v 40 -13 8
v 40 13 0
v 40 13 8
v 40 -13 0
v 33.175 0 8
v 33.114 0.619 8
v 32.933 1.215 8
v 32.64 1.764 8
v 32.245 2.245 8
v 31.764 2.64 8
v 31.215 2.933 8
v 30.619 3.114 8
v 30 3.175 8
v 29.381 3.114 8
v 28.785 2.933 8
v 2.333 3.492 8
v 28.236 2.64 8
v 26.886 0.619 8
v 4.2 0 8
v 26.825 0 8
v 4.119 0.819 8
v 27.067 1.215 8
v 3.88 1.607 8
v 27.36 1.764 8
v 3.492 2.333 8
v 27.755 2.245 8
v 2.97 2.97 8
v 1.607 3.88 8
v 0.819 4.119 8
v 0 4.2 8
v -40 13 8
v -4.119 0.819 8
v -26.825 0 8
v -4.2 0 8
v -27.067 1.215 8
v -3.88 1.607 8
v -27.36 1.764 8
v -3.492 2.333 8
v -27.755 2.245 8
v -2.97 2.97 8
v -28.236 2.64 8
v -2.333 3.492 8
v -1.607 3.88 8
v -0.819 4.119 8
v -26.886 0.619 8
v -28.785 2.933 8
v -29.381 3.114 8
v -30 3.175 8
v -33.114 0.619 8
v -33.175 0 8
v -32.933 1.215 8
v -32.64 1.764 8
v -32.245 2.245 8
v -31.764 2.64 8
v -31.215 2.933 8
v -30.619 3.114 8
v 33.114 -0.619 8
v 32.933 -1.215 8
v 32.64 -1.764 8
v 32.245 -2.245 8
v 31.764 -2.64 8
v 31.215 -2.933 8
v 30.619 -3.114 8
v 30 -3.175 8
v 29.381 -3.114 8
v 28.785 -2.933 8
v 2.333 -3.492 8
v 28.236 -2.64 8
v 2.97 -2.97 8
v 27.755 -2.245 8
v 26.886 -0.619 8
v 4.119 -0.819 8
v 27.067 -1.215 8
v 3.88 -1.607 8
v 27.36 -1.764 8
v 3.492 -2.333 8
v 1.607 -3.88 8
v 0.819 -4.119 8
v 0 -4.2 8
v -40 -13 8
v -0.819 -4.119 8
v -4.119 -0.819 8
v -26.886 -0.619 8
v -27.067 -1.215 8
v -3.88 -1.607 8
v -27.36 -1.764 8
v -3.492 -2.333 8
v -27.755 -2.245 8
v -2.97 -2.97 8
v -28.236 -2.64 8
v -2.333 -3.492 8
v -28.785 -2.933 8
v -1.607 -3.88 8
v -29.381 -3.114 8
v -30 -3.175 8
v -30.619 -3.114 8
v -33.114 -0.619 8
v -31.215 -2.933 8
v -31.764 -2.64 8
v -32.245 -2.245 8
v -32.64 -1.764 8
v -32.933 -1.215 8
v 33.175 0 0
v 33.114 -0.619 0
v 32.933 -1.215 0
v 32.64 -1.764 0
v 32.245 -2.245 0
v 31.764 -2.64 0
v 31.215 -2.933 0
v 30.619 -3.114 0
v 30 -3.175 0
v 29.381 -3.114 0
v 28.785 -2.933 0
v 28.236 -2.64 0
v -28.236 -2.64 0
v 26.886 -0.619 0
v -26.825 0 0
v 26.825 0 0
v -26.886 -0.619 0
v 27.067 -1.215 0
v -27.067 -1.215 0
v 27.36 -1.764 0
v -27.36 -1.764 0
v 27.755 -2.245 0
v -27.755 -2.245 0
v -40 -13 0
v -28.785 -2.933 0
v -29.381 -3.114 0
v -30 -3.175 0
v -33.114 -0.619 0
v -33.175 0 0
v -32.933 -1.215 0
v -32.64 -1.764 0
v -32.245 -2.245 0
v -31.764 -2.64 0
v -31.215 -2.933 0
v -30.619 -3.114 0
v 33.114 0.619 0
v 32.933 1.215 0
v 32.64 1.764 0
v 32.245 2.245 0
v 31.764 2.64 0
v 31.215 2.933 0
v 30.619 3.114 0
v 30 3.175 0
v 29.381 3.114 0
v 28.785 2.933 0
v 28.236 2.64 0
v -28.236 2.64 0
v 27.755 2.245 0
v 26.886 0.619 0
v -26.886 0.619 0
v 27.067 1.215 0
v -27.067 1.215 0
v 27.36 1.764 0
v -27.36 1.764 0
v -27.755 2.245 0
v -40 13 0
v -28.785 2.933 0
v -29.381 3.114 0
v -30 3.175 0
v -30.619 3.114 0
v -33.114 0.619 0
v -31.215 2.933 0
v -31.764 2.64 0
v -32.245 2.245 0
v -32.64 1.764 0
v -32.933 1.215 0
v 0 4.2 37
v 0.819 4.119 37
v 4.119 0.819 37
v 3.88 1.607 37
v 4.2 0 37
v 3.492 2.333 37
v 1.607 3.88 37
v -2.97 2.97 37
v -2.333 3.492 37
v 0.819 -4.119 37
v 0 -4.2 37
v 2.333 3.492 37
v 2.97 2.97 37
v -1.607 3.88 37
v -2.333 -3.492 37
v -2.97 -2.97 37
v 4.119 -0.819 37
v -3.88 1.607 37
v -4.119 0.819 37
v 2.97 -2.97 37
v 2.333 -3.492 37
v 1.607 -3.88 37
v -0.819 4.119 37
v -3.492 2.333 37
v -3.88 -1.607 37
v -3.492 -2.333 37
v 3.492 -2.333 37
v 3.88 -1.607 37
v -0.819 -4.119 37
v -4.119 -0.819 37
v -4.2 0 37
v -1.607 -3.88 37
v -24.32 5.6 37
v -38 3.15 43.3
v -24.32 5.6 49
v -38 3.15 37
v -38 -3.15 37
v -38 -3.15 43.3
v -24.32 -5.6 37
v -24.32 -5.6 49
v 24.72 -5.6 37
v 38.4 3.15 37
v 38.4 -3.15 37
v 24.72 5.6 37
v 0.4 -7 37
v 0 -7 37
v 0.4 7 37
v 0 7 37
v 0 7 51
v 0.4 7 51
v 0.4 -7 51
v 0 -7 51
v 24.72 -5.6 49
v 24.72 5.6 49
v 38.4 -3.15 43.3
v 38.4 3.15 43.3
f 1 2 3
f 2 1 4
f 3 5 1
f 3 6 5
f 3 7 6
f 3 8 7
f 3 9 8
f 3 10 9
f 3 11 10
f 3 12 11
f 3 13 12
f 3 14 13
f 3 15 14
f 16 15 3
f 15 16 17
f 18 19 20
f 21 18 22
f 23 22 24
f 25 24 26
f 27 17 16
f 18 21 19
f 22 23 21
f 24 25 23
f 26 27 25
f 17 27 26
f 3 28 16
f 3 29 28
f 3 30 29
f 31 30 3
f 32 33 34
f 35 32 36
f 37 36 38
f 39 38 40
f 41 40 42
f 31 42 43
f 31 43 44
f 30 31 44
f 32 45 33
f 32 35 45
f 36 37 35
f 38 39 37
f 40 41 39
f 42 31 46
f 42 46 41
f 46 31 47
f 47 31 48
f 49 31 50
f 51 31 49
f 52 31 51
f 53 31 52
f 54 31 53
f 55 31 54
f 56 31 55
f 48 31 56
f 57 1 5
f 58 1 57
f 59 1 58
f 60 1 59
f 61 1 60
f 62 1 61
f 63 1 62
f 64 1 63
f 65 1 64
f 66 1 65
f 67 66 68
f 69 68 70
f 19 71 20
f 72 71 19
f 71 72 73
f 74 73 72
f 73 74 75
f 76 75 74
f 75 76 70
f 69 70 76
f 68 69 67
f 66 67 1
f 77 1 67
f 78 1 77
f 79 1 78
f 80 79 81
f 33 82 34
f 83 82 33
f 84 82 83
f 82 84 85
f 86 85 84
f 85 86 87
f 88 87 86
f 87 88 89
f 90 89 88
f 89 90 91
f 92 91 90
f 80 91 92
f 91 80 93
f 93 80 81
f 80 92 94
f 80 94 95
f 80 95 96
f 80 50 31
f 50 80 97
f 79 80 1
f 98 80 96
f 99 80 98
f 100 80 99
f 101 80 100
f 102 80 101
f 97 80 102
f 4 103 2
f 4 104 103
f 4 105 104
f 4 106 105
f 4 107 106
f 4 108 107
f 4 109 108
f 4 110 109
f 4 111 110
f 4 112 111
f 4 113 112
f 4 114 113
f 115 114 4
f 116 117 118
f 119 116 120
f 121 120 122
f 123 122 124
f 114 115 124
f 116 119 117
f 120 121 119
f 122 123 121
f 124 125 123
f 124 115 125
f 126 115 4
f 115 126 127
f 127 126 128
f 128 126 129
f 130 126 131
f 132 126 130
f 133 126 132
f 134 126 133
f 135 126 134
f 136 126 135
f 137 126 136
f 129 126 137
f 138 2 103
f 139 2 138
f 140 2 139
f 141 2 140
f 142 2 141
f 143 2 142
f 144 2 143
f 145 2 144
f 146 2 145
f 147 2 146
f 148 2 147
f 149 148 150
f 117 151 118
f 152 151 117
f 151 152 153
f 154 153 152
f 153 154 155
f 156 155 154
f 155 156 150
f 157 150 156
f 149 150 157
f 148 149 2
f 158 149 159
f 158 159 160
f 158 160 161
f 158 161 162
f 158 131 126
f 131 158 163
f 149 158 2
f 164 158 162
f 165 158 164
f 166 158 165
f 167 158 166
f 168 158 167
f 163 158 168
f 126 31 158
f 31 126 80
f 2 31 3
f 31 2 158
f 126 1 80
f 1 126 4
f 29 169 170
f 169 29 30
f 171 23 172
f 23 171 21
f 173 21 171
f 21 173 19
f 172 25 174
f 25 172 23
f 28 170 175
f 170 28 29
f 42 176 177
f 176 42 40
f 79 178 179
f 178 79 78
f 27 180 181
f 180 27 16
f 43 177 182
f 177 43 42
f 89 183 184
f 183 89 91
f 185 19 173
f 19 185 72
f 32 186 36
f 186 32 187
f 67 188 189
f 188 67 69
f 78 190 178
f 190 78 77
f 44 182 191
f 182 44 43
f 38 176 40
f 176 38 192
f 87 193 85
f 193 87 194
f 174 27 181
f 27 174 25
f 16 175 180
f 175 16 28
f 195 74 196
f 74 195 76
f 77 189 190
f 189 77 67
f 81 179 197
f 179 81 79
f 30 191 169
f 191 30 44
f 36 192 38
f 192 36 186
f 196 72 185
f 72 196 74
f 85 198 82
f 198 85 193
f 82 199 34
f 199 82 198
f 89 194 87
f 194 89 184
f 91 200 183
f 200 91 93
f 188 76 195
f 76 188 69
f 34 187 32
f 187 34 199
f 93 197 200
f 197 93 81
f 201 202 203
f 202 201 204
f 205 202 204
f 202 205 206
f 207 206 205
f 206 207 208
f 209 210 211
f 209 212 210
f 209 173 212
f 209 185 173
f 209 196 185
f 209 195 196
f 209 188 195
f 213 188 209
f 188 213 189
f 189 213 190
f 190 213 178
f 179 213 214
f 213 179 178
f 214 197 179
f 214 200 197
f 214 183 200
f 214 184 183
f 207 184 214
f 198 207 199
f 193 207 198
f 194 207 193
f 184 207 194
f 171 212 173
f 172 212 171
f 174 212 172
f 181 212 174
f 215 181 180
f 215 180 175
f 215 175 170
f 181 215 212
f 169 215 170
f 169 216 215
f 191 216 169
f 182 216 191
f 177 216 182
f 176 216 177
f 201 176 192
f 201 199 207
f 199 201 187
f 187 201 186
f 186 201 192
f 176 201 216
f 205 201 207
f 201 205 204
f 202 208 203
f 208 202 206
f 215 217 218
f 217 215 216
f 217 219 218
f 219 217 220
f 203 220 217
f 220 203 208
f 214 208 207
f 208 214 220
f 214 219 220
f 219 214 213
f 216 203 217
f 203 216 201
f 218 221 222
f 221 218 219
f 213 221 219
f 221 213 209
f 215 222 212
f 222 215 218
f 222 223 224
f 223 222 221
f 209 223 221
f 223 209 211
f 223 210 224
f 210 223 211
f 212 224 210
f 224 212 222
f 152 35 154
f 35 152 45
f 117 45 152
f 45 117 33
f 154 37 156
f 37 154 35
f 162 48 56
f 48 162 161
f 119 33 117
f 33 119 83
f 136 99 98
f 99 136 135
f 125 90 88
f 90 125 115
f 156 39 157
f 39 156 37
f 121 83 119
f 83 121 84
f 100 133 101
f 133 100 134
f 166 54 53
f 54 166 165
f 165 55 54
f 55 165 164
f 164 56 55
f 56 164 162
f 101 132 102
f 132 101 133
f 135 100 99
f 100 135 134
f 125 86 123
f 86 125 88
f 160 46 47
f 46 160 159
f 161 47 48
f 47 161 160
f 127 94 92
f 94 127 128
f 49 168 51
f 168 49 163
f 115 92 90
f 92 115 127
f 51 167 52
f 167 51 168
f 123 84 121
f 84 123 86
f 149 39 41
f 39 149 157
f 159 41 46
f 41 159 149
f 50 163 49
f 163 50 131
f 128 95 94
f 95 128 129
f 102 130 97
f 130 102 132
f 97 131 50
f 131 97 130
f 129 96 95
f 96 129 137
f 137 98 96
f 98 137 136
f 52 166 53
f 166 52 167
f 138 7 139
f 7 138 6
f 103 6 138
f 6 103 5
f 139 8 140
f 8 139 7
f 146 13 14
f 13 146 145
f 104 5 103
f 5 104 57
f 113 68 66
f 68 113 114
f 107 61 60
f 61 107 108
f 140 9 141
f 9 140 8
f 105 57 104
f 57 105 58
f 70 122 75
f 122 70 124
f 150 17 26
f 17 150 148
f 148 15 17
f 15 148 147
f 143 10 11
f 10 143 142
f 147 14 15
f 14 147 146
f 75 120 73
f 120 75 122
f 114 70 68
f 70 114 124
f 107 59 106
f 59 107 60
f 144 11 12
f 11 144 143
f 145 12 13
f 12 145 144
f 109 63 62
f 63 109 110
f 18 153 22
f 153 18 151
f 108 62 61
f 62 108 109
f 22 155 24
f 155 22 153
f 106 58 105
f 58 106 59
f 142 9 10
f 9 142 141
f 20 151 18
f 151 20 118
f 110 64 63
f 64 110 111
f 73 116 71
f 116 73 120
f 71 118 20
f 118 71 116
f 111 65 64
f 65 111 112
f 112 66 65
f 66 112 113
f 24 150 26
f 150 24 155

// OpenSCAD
$fn = 32;

// ----------------------------------------------------------------------
// Boat cleat: 80 mm base, horn 44 mm up
// ----------------------------------------------------------------------

// --- parameters (mm) ---
base_l = 80;              // base length
base_w = 26;              // base width
base_t = 8;               // base thickness
horn_len = 76;            // horn length
horn_d = 14;              // horn diameter at the middle
horn_z = 44;              // horn axis height
end_drop = 8;             // how far the horn tips drop
post_d = 8.4;             // centre post diameter
holes_d = 6.35;           // fixing holes
hole_x = 30;              // fixing hole spacing

difference() {
  union() {
    translate([-40, -13, 0]) cube([base_l, base_w, base_t]);
    /* centre post, sunk 1 mm into the base */
    translate([0, 0, 7]) cylinder(h = 37, d = post_d);
    /* horn: a hull chain of boxes, full in the middle and lighter at the tips */
    hull() {
      translate([-38, -3.15, 37]) cube([0.4, 6.3, 6.3], center = false);
      translate([-24.32, -5.6, 37]) cube([0.4, 11.2, 12], center = false);
    }
    hull() {
      translate([-24.32, -5.6, 37]) cube([0.4, 11.2, 12], center = false);
      translate([0, -7, 37]) cube([0.4, 14, 14], center = false);
    }
    hull() {
      translate([0, -7, 37]) cube([0.4, 14, 14], center = false);
      translate([24.32, -5.6, 37]) cube([0.4, 11.2, 12], center = false);
    }
    hull() {
      translate([24.32, -5.6, 37]) cube([0.4, 11.2, 12], center = false);
      translate([38, -3.15, 37]) cube([0.4, 6.3, 6.3], center = false);
    }
  }
  translate([-30, 0, -2.5]) cylinder(h = base_t + 5, d = holes_d);
  translate([30, 0, -2.5]) cylinder(h = base_t + 5, d = holes_d);
}
